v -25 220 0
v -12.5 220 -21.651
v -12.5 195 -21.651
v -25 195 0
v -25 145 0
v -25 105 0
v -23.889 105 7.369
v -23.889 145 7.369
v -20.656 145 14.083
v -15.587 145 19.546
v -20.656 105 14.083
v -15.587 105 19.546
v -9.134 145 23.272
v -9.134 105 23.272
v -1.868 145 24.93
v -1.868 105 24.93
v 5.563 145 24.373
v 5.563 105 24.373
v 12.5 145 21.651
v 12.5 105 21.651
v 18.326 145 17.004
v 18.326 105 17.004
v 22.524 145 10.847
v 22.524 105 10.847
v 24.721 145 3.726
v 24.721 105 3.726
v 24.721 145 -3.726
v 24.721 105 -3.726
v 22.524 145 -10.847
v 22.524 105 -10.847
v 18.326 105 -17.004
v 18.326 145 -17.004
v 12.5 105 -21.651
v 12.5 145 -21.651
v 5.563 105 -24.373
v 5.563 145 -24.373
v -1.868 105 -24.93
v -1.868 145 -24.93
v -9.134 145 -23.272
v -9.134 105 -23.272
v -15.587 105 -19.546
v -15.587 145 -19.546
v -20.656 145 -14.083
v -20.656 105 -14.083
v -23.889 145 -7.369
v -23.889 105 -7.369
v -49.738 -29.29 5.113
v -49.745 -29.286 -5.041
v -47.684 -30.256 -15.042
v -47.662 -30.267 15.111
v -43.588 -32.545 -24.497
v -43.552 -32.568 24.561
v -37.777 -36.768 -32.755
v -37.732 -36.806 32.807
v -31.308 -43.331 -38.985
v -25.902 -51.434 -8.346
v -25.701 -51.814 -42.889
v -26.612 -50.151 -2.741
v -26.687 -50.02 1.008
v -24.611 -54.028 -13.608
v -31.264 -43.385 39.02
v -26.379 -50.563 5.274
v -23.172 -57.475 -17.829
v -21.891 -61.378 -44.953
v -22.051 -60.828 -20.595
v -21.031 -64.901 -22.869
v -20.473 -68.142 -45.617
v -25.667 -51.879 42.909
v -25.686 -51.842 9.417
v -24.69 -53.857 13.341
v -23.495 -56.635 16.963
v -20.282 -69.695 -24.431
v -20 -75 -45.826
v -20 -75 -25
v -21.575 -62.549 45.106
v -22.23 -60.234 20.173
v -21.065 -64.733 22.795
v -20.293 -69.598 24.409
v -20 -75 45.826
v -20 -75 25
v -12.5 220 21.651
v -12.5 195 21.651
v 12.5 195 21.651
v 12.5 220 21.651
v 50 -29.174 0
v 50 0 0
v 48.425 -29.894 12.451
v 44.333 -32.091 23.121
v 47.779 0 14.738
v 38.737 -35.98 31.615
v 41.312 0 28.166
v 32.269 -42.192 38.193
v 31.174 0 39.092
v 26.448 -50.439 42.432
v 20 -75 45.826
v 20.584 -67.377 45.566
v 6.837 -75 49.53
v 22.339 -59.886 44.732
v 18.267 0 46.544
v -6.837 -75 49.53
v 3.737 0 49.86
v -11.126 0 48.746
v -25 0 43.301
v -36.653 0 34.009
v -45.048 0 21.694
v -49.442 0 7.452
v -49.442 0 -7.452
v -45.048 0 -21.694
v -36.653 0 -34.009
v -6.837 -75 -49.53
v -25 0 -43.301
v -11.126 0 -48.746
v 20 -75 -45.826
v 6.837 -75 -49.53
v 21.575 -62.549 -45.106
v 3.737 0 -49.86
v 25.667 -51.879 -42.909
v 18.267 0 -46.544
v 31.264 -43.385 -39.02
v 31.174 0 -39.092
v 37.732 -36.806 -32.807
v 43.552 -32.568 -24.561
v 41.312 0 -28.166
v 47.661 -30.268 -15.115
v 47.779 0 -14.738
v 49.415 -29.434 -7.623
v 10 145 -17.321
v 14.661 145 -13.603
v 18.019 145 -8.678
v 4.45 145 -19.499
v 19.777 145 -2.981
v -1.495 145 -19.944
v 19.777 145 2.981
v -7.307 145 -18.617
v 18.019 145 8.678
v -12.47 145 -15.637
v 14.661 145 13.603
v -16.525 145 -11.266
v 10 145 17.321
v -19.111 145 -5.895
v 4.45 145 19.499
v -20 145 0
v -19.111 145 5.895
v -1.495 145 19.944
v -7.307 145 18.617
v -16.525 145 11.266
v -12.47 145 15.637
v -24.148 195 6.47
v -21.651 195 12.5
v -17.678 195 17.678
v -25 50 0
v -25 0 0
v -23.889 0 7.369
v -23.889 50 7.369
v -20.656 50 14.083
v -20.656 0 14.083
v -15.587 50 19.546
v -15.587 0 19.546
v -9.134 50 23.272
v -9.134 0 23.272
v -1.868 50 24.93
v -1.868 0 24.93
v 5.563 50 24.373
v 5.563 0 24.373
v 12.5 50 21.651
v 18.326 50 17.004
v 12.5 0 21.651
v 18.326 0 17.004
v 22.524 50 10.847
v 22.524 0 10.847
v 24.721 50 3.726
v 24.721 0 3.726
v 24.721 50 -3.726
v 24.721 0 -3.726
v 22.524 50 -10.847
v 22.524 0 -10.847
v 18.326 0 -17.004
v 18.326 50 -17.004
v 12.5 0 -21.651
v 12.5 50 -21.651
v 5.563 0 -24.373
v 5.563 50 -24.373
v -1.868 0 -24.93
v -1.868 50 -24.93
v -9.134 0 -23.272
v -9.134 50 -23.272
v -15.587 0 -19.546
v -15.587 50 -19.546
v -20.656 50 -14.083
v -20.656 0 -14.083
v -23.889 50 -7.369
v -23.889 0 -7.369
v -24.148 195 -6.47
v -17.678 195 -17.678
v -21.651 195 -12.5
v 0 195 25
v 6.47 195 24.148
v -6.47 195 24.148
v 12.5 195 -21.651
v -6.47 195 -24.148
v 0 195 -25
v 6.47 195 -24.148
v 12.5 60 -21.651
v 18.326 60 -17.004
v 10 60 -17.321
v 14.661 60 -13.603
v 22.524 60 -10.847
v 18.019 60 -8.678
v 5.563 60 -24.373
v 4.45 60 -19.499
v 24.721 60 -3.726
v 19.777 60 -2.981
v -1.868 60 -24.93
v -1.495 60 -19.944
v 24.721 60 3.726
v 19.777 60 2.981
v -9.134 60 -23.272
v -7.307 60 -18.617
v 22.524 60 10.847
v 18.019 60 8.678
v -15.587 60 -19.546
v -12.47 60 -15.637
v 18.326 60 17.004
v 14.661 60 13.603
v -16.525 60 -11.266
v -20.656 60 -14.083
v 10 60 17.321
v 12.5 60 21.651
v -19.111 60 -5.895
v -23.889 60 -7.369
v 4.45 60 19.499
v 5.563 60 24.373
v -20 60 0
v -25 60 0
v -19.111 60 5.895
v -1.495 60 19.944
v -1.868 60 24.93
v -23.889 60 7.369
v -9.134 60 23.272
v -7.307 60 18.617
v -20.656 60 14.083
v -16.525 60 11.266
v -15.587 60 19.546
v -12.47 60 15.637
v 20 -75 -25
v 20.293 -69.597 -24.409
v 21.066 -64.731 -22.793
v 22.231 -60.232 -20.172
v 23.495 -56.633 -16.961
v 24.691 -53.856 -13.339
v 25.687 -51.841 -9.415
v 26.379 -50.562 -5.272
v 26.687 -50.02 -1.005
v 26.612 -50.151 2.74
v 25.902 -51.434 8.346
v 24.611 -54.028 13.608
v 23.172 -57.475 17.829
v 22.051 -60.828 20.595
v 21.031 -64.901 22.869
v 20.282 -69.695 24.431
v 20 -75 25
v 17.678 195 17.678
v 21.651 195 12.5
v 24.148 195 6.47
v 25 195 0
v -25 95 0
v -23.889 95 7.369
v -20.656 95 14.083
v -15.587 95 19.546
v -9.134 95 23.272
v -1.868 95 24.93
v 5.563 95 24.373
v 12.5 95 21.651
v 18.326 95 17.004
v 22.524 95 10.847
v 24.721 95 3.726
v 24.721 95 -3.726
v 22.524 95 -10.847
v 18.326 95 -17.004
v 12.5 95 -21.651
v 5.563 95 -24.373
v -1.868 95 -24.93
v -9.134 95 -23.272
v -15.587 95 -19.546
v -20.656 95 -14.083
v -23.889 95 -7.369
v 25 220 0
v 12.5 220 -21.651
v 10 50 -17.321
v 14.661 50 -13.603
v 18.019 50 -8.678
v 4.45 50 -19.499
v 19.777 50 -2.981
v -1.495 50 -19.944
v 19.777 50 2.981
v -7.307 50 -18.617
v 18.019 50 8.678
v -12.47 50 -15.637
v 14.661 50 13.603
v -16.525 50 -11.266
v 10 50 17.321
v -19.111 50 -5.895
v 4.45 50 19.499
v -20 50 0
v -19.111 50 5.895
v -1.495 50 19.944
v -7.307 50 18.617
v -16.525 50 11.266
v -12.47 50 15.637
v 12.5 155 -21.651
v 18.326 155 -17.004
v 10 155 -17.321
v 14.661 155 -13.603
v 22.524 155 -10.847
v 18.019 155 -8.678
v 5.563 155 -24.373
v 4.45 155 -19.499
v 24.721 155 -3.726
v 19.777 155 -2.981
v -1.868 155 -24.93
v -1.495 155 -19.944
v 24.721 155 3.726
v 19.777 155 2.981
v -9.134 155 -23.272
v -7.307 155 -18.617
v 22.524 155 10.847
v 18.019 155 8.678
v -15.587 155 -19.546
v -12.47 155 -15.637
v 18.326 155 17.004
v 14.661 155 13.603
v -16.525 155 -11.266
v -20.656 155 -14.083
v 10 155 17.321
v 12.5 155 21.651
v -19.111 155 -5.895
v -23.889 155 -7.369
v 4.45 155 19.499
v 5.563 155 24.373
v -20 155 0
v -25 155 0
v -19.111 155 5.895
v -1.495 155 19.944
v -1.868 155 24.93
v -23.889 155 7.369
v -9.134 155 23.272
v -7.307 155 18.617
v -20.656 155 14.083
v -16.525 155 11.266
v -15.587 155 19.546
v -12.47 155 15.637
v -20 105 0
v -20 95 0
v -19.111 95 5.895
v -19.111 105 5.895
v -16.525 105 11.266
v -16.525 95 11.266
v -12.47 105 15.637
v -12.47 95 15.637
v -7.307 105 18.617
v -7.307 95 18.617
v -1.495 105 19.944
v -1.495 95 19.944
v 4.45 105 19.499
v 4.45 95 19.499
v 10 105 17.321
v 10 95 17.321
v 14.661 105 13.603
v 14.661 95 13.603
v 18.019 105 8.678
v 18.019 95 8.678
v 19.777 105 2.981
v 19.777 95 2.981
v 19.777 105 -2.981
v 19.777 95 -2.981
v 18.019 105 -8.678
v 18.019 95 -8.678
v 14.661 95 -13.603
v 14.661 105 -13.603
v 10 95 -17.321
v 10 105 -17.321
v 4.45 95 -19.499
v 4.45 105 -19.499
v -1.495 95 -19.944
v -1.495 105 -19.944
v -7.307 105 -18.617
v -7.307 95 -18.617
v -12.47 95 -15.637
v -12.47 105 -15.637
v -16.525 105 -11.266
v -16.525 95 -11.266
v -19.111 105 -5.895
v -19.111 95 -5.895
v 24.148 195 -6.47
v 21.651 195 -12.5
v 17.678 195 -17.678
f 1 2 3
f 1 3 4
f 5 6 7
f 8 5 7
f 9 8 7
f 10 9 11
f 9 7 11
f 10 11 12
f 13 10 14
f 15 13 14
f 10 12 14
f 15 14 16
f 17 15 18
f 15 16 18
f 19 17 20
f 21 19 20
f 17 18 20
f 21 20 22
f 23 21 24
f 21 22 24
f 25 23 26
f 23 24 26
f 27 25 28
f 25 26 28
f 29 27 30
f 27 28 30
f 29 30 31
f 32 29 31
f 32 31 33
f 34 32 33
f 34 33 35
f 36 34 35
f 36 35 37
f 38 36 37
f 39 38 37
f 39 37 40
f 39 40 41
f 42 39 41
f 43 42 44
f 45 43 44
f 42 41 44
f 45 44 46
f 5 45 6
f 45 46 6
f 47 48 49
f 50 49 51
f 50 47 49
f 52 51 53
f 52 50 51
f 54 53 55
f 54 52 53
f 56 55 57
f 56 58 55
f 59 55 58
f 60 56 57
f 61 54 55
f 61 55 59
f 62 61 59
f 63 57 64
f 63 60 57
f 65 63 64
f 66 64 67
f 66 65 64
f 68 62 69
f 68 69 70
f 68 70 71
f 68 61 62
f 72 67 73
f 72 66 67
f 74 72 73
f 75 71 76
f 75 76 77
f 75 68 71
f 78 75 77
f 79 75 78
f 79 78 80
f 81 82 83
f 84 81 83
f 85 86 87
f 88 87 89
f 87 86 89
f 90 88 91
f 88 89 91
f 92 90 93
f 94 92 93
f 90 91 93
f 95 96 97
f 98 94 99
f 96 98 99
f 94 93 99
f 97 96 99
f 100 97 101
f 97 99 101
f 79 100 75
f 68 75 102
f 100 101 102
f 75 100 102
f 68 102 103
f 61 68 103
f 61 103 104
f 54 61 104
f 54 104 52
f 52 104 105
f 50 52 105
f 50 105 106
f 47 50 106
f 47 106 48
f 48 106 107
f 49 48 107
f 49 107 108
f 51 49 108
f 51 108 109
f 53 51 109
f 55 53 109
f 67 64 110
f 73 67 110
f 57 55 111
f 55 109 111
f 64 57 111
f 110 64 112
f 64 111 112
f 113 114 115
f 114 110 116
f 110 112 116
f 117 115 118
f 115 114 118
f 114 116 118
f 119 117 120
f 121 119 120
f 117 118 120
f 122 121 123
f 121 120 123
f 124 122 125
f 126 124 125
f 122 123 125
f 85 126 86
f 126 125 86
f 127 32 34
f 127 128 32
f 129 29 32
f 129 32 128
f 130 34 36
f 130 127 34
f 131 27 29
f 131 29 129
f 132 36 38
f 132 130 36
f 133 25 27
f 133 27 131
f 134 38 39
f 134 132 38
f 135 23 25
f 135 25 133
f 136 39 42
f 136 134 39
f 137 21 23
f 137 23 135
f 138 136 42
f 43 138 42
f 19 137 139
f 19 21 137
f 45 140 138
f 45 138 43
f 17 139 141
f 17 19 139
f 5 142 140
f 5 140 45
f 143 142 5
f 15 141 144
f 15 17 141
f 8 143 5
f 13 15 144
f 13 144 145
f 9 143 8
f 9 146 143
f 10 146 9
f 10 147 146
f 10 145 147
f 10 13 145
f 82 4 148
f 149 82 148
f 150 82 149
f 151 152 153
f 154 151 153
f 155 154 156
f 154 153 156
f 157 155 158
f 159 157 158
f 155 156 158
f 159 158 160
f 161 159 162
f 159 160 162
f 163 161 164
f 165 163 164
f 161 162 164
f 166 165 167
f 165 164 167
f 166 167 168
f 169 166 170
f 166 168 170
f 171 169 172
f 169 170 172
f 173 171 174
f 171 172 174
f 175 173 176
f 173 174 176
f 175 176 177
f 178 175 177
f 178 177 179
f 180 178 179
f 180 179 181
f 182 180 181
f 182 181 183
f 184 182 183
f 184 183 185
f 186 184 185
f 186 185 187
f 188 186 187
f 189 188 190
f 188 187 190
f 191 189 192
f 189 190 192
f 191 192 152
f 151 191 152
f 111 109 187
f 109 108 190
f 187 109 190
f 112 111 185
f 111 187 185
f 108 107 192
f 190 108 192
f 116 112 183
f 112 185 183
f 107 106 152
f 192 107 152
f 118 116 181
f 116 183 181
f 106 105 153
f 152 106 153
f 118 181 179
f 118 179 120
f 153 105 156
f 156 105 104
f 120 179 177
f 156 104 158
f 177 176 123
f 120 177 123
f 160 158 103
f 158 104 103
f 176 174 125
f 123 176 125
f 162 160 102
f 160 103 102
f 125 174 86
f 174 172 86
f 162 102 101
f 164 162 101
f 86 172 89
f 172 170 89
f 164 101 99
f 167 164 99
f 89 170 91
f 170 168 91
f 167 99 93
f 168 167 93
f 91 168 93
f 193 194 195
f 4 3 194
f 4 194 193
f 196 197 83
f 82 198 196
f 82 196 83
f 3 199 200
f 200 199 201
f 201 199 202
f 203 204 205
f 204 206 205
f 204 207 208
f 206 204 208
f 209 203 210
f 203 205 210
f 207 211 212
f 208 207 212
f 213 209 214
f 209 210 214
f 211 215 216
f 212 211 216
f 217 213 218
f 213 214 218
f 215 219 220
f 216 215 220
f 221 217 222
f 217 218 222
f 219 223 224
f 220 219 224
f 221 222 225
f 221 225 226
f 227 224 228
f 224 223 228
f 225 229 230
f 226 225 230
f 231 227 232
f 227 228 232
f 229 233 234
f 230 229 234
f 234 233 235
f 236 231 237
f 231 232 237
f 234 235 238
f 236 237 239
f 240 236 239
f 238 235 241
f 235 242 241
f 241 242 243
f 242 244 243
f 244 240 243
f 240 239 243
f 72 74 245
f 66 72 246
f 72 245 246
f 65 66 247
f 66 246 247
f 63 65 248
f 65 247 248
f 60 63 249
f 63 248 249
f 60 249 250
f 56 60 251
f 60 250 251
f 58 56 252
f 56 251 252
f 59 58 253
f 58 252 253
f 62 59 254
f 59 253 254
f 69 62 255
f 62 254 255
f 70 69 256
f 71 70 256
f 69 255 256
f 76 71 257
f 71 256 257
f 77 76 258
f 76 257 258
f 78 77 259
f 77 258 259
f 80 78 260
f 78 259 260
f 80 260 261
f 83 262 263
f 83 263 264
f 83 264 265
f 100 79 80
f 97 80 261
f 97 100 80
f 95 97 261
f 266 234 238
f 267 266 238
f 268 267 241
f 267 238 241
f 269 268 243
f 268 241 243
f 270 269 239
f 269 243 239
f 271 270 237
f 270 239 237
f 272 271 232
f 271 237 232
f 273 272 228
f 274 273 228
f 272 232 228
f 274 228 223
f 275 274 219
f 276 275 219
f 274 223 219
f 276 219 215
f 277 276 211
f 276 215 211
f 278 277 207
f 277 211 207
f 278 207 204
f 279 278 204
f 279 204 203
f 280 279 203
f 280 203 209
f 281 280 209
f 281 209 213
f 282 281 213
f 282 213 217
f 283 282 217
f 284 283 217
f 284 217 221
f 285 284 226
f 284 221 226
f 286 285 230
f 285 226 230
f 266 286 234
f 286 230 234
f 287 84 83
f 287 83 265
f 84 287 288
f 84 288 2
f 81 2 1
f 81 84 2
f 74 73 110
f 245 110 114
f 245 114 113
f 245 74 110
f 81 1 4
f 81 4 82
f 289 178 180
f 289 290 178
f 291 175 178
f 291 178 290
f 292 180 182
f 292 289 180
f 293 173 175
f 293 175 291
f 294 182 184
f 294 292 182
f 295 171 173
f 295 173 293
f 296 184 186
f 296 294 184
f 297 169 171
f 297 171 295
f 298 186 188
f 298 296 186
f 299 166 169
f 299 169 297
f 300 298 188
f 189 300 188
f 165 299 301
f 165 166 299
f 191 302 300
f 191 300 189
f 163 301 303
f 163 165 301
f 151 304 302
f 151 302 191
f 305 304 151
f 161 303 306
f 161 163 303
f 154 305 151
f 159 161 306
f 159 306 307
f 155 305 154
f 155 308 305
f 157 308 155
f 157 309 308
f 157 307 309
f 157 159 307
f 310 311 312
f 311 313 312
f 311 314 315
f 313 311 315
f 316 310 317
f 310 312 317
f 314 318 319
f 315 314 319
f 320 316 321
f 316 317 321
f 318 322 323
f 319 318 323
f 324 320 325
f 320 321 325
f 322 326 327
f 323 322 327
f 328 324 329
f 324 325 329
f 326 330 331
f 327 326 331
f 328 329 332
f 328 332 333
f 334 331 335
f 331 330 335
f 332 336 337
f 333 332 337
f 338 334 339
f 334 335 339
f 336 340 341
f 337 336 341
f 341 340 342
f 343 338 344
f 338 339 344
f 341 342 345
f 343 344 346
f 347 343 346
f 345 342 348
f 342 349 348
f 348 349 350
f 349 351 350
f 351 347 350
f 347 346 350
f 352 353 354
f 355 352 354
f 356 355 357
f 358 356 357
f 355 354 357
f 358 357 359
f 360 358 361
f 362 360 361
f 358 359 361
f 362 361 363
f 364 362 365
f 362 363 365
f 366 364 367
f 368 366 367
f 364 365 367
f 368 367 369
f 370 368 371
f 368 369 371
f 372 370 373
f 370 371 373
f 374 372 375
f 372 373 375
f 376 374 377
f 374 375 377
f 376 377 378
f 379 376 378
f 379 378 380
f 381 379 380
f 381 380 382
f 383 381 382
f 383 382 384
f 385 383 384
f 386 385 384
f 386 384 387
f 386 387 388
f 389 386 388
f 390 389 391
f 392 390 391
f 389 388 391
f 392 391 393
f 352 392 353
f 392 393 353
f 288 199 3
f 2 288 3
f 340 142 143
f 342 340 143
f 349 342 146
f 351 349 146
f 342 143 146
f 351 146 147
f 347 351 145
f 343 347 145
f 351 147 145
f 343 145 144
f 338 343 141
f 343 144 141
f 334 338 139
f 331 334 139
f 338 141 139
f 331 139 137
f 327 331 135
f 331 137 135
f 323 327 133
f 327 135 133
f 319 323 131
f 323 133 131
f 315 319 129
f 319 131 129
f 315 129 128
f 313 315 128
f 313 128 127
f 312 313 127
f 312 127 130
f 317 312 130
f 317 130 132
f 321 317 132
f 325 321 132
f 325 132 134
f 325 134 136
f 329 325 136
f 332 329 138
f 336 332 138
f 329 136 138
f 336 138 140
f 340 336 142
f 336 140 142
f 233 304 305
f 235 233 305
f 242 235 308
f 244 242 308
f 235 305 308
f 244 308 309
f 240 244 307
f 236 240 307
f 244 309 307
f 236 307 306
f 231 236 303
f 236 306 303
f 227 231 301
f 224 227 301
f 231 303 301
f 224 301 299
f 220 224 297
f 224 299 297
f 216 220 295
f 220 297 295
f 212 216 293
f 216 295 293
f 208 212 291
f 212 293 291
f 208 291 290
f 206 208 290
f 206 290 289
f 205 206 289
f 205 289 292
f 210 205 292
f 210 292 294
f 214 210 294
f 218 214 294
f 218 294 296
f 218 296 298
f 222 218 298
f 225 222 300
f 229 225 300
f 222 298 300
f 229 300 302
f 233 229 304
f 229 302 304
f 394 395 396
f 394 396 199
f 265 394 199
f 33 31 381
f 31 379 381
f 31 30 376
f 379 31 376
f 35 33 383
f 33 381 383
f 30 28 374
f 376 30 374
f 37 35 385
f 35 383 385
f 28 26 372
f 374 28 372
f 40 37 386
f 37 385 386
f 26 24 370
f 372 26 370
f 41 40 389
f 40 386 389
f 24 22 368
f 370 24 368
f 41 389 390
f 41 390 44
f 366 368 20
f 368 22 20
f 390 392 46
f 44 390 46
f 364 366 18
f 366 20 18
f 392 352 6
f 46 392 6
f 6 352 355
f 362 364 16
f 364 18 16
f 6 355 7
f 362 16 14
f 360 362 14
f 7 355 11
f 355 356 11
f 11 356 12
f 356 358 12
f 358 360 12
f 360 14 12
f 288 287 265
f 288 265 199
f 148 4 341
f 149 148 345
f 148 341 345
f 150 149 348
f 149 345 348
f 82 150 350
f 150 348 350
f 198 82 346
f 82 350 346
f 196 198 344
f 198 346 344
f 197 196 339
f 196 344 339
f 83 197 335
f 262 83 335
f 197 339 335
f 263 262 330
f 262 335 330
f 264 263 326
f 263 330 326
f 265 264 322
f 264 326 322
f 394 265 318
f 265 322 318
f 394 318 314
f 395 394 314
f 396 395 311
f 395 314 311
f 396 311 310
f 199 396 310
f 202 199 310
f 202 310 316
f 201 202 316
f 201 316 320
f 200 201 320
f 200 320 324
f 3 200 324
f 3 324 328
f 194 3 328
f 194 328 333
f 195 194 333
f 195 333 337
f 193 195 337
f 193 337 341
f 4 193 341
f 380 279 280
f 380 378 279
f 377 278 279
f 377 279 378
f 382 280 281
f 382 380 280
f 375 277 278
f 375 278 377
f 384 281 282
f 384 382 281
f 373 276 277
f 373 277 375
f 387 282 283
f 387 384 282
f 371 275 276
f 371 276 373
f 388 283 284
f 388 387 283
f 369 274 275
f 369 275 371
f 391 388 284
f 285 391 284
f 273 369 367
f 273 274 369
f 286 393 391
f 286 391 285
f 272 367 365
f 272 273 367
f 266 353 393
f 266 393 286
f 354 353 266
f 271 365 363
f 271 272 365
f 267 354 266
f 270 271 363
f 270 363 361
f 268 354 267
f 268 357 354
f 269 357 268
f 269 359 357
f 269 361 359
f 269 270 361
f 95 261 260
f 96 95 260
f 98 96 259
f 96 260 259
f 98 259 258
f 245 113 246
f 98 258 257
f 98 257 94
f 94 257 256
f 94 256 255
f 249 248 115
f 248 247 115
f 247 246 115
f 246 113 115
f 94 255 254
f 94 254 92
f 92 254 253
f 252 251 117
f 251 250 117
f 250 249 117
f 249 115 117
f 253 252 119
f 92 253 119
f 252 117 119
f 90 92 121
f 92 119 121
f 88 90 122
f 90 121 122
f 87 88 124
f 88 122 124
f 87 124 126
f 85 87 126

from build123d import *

# Parameters (mm, degrees)
F0_R      = 50
F1_DEPTH  = 75
F2_R      = 25
F3_DEPTH  = 50
F4_R      = 20
F5_DEPTH  = 10
F6_R      = 25
F7_DEPTH  = 35
F8_R      = 20
F9_DEPTH  = 10
F10_R     = 25
F11_DEPTH = 40
F12_R     = 20
F13_DEPTH = 10
F14_R     = 25
F15_DEPTH = 40
F17_DEPTH = 25
F19_ANGLE = 90
F22_R     = 25
F23_DEPTH = 50


# Not quite as in the source:
# - a feature names something its author has since deleted; it is built from what else it names


with BuildPart() as f1:
    # F0 (on Front) → F1 (new body)
    with BuildSketch(Plane.XZ):
        Circle(F0_R)
    extrude(amount=F1_DEPTH)

    # F2 (on face) → F3 (join)
    with BuildSketch(Plane(origin=(0, 0, 0), x_dir=(-1, 0, 0), z_dir=(0, 1, 0))):
        Circle(F2_R)
    extrude(amount=F3_DEPTH)

    # F4 (on face) → F5 (join)
    with BuildSketch(Plane(origin=(0, 50, 0), x_dir=(-1, 0, 0), z_dir=(0, 1, 0))):
        Circle(F4_R)
    extrude(amount=F5_DEPTH)

    # F6 (on face) → F7 (join)
    with BuildSketch(Plane(origin=(0, 60, 0), x_dir=(-1, 0, 0), z_dir=(0, 1, 0))):
        Circle(F6_R)
    extrude(amount=F7_DEPTH)

    # F8 (on face) → F9 (join)
    with BuildSketch(Plane(origin=(0, 95, 0), x_dir=(-1, 0, 0), z_dir=(0, 1, 0))):
        Circle(F8_R)
    extrude(amount=F9_DEPTH)

    # F10 (on face) → F11 (join)
    with BuildSketch(Plane(origin=(0, 105, 0), x_dir=(-1, 0, 0), z_dir=(0, 1, 0))):
        Circle(F10_R)
    extrude(amount=F11_DEPTH)

    # F12 (on face) → F13 (join)
    with BuildSketch(Plane(origin=(0, 145, 0), x_dir=(-1, 0, 0), z_dir=(0, 1, 0))):
        Circle(F12_R)
    extrude(amount=F13_DEPTH)

    # F14 (on face) → F15 (join)
    with BuildSketch(Plane(origin=(0, 155, 0), x_dir=(-1, 0, 0), z_dir=(0, 1, 0))):
        Circle(F14_R)
    extrude(amount=F15_DEPTH)

    # F16 (on face) → F17 (join)
    with BuildSketch(Plane(origin=(0, 195, 0), x_dir=(-1, 0, 0), z_dir=(0, 1, 0))):
        Polygon((12.5, 21.6506350946), (-12.5, 21.6506350946), (-25, 0), (-12.5, -21.6506350946), (12.5, -21.6506350946), (25, 0), align=None)
    extrude(amount=F17_DEPTH)

    # F18 (on face) → F19 (revolve, cut)
    with BuildSketch(Plane.XZ.offset(75)):
        with BuildLine():
            ThreePointArc((50, 0), (41.8330013267, 27.3861278753), (20, 45.8257569496))
            Line((20, 45.8257569496), (20, -45.8257569496))
            ThreePointArc((20, -45.8257569496), (41.8330013267, -27.3861278753), (50, 0))
        make_face()
    revolve(axis=Axis((70, -75, -0.5619522762), (0, 0, -1)), revolution_arc=F19_ANGLE, mode=Mode.SUBTRACT)

    # F20 (on face) → F21 (revolve, cut)
    with BuildSketch(Plane.XZ.offset(75)):
        with BuildLine():
            Line((-20, -45.8257569496), (-20, 45.8257569496))
            ThreePointArc((-20, 45.8257569496), (-50, 0), (-20, -45.8257569496))
        make_face()
    revolve(axis=Axis((-70, -75, -0.6762938916), (0, 0, -1)), mode=Mode.SUBTRACT)

    # F22 (on Right) → F23 (cut, symmetric)
    with BuildSketch(Plane.YZ):
        with Locations((-75, 0)):
            Circle(F22_R)
    extrude(amount=F23_DEPTH, both=True, mode=Mode.SUBTRACT)


solid = f1.part
